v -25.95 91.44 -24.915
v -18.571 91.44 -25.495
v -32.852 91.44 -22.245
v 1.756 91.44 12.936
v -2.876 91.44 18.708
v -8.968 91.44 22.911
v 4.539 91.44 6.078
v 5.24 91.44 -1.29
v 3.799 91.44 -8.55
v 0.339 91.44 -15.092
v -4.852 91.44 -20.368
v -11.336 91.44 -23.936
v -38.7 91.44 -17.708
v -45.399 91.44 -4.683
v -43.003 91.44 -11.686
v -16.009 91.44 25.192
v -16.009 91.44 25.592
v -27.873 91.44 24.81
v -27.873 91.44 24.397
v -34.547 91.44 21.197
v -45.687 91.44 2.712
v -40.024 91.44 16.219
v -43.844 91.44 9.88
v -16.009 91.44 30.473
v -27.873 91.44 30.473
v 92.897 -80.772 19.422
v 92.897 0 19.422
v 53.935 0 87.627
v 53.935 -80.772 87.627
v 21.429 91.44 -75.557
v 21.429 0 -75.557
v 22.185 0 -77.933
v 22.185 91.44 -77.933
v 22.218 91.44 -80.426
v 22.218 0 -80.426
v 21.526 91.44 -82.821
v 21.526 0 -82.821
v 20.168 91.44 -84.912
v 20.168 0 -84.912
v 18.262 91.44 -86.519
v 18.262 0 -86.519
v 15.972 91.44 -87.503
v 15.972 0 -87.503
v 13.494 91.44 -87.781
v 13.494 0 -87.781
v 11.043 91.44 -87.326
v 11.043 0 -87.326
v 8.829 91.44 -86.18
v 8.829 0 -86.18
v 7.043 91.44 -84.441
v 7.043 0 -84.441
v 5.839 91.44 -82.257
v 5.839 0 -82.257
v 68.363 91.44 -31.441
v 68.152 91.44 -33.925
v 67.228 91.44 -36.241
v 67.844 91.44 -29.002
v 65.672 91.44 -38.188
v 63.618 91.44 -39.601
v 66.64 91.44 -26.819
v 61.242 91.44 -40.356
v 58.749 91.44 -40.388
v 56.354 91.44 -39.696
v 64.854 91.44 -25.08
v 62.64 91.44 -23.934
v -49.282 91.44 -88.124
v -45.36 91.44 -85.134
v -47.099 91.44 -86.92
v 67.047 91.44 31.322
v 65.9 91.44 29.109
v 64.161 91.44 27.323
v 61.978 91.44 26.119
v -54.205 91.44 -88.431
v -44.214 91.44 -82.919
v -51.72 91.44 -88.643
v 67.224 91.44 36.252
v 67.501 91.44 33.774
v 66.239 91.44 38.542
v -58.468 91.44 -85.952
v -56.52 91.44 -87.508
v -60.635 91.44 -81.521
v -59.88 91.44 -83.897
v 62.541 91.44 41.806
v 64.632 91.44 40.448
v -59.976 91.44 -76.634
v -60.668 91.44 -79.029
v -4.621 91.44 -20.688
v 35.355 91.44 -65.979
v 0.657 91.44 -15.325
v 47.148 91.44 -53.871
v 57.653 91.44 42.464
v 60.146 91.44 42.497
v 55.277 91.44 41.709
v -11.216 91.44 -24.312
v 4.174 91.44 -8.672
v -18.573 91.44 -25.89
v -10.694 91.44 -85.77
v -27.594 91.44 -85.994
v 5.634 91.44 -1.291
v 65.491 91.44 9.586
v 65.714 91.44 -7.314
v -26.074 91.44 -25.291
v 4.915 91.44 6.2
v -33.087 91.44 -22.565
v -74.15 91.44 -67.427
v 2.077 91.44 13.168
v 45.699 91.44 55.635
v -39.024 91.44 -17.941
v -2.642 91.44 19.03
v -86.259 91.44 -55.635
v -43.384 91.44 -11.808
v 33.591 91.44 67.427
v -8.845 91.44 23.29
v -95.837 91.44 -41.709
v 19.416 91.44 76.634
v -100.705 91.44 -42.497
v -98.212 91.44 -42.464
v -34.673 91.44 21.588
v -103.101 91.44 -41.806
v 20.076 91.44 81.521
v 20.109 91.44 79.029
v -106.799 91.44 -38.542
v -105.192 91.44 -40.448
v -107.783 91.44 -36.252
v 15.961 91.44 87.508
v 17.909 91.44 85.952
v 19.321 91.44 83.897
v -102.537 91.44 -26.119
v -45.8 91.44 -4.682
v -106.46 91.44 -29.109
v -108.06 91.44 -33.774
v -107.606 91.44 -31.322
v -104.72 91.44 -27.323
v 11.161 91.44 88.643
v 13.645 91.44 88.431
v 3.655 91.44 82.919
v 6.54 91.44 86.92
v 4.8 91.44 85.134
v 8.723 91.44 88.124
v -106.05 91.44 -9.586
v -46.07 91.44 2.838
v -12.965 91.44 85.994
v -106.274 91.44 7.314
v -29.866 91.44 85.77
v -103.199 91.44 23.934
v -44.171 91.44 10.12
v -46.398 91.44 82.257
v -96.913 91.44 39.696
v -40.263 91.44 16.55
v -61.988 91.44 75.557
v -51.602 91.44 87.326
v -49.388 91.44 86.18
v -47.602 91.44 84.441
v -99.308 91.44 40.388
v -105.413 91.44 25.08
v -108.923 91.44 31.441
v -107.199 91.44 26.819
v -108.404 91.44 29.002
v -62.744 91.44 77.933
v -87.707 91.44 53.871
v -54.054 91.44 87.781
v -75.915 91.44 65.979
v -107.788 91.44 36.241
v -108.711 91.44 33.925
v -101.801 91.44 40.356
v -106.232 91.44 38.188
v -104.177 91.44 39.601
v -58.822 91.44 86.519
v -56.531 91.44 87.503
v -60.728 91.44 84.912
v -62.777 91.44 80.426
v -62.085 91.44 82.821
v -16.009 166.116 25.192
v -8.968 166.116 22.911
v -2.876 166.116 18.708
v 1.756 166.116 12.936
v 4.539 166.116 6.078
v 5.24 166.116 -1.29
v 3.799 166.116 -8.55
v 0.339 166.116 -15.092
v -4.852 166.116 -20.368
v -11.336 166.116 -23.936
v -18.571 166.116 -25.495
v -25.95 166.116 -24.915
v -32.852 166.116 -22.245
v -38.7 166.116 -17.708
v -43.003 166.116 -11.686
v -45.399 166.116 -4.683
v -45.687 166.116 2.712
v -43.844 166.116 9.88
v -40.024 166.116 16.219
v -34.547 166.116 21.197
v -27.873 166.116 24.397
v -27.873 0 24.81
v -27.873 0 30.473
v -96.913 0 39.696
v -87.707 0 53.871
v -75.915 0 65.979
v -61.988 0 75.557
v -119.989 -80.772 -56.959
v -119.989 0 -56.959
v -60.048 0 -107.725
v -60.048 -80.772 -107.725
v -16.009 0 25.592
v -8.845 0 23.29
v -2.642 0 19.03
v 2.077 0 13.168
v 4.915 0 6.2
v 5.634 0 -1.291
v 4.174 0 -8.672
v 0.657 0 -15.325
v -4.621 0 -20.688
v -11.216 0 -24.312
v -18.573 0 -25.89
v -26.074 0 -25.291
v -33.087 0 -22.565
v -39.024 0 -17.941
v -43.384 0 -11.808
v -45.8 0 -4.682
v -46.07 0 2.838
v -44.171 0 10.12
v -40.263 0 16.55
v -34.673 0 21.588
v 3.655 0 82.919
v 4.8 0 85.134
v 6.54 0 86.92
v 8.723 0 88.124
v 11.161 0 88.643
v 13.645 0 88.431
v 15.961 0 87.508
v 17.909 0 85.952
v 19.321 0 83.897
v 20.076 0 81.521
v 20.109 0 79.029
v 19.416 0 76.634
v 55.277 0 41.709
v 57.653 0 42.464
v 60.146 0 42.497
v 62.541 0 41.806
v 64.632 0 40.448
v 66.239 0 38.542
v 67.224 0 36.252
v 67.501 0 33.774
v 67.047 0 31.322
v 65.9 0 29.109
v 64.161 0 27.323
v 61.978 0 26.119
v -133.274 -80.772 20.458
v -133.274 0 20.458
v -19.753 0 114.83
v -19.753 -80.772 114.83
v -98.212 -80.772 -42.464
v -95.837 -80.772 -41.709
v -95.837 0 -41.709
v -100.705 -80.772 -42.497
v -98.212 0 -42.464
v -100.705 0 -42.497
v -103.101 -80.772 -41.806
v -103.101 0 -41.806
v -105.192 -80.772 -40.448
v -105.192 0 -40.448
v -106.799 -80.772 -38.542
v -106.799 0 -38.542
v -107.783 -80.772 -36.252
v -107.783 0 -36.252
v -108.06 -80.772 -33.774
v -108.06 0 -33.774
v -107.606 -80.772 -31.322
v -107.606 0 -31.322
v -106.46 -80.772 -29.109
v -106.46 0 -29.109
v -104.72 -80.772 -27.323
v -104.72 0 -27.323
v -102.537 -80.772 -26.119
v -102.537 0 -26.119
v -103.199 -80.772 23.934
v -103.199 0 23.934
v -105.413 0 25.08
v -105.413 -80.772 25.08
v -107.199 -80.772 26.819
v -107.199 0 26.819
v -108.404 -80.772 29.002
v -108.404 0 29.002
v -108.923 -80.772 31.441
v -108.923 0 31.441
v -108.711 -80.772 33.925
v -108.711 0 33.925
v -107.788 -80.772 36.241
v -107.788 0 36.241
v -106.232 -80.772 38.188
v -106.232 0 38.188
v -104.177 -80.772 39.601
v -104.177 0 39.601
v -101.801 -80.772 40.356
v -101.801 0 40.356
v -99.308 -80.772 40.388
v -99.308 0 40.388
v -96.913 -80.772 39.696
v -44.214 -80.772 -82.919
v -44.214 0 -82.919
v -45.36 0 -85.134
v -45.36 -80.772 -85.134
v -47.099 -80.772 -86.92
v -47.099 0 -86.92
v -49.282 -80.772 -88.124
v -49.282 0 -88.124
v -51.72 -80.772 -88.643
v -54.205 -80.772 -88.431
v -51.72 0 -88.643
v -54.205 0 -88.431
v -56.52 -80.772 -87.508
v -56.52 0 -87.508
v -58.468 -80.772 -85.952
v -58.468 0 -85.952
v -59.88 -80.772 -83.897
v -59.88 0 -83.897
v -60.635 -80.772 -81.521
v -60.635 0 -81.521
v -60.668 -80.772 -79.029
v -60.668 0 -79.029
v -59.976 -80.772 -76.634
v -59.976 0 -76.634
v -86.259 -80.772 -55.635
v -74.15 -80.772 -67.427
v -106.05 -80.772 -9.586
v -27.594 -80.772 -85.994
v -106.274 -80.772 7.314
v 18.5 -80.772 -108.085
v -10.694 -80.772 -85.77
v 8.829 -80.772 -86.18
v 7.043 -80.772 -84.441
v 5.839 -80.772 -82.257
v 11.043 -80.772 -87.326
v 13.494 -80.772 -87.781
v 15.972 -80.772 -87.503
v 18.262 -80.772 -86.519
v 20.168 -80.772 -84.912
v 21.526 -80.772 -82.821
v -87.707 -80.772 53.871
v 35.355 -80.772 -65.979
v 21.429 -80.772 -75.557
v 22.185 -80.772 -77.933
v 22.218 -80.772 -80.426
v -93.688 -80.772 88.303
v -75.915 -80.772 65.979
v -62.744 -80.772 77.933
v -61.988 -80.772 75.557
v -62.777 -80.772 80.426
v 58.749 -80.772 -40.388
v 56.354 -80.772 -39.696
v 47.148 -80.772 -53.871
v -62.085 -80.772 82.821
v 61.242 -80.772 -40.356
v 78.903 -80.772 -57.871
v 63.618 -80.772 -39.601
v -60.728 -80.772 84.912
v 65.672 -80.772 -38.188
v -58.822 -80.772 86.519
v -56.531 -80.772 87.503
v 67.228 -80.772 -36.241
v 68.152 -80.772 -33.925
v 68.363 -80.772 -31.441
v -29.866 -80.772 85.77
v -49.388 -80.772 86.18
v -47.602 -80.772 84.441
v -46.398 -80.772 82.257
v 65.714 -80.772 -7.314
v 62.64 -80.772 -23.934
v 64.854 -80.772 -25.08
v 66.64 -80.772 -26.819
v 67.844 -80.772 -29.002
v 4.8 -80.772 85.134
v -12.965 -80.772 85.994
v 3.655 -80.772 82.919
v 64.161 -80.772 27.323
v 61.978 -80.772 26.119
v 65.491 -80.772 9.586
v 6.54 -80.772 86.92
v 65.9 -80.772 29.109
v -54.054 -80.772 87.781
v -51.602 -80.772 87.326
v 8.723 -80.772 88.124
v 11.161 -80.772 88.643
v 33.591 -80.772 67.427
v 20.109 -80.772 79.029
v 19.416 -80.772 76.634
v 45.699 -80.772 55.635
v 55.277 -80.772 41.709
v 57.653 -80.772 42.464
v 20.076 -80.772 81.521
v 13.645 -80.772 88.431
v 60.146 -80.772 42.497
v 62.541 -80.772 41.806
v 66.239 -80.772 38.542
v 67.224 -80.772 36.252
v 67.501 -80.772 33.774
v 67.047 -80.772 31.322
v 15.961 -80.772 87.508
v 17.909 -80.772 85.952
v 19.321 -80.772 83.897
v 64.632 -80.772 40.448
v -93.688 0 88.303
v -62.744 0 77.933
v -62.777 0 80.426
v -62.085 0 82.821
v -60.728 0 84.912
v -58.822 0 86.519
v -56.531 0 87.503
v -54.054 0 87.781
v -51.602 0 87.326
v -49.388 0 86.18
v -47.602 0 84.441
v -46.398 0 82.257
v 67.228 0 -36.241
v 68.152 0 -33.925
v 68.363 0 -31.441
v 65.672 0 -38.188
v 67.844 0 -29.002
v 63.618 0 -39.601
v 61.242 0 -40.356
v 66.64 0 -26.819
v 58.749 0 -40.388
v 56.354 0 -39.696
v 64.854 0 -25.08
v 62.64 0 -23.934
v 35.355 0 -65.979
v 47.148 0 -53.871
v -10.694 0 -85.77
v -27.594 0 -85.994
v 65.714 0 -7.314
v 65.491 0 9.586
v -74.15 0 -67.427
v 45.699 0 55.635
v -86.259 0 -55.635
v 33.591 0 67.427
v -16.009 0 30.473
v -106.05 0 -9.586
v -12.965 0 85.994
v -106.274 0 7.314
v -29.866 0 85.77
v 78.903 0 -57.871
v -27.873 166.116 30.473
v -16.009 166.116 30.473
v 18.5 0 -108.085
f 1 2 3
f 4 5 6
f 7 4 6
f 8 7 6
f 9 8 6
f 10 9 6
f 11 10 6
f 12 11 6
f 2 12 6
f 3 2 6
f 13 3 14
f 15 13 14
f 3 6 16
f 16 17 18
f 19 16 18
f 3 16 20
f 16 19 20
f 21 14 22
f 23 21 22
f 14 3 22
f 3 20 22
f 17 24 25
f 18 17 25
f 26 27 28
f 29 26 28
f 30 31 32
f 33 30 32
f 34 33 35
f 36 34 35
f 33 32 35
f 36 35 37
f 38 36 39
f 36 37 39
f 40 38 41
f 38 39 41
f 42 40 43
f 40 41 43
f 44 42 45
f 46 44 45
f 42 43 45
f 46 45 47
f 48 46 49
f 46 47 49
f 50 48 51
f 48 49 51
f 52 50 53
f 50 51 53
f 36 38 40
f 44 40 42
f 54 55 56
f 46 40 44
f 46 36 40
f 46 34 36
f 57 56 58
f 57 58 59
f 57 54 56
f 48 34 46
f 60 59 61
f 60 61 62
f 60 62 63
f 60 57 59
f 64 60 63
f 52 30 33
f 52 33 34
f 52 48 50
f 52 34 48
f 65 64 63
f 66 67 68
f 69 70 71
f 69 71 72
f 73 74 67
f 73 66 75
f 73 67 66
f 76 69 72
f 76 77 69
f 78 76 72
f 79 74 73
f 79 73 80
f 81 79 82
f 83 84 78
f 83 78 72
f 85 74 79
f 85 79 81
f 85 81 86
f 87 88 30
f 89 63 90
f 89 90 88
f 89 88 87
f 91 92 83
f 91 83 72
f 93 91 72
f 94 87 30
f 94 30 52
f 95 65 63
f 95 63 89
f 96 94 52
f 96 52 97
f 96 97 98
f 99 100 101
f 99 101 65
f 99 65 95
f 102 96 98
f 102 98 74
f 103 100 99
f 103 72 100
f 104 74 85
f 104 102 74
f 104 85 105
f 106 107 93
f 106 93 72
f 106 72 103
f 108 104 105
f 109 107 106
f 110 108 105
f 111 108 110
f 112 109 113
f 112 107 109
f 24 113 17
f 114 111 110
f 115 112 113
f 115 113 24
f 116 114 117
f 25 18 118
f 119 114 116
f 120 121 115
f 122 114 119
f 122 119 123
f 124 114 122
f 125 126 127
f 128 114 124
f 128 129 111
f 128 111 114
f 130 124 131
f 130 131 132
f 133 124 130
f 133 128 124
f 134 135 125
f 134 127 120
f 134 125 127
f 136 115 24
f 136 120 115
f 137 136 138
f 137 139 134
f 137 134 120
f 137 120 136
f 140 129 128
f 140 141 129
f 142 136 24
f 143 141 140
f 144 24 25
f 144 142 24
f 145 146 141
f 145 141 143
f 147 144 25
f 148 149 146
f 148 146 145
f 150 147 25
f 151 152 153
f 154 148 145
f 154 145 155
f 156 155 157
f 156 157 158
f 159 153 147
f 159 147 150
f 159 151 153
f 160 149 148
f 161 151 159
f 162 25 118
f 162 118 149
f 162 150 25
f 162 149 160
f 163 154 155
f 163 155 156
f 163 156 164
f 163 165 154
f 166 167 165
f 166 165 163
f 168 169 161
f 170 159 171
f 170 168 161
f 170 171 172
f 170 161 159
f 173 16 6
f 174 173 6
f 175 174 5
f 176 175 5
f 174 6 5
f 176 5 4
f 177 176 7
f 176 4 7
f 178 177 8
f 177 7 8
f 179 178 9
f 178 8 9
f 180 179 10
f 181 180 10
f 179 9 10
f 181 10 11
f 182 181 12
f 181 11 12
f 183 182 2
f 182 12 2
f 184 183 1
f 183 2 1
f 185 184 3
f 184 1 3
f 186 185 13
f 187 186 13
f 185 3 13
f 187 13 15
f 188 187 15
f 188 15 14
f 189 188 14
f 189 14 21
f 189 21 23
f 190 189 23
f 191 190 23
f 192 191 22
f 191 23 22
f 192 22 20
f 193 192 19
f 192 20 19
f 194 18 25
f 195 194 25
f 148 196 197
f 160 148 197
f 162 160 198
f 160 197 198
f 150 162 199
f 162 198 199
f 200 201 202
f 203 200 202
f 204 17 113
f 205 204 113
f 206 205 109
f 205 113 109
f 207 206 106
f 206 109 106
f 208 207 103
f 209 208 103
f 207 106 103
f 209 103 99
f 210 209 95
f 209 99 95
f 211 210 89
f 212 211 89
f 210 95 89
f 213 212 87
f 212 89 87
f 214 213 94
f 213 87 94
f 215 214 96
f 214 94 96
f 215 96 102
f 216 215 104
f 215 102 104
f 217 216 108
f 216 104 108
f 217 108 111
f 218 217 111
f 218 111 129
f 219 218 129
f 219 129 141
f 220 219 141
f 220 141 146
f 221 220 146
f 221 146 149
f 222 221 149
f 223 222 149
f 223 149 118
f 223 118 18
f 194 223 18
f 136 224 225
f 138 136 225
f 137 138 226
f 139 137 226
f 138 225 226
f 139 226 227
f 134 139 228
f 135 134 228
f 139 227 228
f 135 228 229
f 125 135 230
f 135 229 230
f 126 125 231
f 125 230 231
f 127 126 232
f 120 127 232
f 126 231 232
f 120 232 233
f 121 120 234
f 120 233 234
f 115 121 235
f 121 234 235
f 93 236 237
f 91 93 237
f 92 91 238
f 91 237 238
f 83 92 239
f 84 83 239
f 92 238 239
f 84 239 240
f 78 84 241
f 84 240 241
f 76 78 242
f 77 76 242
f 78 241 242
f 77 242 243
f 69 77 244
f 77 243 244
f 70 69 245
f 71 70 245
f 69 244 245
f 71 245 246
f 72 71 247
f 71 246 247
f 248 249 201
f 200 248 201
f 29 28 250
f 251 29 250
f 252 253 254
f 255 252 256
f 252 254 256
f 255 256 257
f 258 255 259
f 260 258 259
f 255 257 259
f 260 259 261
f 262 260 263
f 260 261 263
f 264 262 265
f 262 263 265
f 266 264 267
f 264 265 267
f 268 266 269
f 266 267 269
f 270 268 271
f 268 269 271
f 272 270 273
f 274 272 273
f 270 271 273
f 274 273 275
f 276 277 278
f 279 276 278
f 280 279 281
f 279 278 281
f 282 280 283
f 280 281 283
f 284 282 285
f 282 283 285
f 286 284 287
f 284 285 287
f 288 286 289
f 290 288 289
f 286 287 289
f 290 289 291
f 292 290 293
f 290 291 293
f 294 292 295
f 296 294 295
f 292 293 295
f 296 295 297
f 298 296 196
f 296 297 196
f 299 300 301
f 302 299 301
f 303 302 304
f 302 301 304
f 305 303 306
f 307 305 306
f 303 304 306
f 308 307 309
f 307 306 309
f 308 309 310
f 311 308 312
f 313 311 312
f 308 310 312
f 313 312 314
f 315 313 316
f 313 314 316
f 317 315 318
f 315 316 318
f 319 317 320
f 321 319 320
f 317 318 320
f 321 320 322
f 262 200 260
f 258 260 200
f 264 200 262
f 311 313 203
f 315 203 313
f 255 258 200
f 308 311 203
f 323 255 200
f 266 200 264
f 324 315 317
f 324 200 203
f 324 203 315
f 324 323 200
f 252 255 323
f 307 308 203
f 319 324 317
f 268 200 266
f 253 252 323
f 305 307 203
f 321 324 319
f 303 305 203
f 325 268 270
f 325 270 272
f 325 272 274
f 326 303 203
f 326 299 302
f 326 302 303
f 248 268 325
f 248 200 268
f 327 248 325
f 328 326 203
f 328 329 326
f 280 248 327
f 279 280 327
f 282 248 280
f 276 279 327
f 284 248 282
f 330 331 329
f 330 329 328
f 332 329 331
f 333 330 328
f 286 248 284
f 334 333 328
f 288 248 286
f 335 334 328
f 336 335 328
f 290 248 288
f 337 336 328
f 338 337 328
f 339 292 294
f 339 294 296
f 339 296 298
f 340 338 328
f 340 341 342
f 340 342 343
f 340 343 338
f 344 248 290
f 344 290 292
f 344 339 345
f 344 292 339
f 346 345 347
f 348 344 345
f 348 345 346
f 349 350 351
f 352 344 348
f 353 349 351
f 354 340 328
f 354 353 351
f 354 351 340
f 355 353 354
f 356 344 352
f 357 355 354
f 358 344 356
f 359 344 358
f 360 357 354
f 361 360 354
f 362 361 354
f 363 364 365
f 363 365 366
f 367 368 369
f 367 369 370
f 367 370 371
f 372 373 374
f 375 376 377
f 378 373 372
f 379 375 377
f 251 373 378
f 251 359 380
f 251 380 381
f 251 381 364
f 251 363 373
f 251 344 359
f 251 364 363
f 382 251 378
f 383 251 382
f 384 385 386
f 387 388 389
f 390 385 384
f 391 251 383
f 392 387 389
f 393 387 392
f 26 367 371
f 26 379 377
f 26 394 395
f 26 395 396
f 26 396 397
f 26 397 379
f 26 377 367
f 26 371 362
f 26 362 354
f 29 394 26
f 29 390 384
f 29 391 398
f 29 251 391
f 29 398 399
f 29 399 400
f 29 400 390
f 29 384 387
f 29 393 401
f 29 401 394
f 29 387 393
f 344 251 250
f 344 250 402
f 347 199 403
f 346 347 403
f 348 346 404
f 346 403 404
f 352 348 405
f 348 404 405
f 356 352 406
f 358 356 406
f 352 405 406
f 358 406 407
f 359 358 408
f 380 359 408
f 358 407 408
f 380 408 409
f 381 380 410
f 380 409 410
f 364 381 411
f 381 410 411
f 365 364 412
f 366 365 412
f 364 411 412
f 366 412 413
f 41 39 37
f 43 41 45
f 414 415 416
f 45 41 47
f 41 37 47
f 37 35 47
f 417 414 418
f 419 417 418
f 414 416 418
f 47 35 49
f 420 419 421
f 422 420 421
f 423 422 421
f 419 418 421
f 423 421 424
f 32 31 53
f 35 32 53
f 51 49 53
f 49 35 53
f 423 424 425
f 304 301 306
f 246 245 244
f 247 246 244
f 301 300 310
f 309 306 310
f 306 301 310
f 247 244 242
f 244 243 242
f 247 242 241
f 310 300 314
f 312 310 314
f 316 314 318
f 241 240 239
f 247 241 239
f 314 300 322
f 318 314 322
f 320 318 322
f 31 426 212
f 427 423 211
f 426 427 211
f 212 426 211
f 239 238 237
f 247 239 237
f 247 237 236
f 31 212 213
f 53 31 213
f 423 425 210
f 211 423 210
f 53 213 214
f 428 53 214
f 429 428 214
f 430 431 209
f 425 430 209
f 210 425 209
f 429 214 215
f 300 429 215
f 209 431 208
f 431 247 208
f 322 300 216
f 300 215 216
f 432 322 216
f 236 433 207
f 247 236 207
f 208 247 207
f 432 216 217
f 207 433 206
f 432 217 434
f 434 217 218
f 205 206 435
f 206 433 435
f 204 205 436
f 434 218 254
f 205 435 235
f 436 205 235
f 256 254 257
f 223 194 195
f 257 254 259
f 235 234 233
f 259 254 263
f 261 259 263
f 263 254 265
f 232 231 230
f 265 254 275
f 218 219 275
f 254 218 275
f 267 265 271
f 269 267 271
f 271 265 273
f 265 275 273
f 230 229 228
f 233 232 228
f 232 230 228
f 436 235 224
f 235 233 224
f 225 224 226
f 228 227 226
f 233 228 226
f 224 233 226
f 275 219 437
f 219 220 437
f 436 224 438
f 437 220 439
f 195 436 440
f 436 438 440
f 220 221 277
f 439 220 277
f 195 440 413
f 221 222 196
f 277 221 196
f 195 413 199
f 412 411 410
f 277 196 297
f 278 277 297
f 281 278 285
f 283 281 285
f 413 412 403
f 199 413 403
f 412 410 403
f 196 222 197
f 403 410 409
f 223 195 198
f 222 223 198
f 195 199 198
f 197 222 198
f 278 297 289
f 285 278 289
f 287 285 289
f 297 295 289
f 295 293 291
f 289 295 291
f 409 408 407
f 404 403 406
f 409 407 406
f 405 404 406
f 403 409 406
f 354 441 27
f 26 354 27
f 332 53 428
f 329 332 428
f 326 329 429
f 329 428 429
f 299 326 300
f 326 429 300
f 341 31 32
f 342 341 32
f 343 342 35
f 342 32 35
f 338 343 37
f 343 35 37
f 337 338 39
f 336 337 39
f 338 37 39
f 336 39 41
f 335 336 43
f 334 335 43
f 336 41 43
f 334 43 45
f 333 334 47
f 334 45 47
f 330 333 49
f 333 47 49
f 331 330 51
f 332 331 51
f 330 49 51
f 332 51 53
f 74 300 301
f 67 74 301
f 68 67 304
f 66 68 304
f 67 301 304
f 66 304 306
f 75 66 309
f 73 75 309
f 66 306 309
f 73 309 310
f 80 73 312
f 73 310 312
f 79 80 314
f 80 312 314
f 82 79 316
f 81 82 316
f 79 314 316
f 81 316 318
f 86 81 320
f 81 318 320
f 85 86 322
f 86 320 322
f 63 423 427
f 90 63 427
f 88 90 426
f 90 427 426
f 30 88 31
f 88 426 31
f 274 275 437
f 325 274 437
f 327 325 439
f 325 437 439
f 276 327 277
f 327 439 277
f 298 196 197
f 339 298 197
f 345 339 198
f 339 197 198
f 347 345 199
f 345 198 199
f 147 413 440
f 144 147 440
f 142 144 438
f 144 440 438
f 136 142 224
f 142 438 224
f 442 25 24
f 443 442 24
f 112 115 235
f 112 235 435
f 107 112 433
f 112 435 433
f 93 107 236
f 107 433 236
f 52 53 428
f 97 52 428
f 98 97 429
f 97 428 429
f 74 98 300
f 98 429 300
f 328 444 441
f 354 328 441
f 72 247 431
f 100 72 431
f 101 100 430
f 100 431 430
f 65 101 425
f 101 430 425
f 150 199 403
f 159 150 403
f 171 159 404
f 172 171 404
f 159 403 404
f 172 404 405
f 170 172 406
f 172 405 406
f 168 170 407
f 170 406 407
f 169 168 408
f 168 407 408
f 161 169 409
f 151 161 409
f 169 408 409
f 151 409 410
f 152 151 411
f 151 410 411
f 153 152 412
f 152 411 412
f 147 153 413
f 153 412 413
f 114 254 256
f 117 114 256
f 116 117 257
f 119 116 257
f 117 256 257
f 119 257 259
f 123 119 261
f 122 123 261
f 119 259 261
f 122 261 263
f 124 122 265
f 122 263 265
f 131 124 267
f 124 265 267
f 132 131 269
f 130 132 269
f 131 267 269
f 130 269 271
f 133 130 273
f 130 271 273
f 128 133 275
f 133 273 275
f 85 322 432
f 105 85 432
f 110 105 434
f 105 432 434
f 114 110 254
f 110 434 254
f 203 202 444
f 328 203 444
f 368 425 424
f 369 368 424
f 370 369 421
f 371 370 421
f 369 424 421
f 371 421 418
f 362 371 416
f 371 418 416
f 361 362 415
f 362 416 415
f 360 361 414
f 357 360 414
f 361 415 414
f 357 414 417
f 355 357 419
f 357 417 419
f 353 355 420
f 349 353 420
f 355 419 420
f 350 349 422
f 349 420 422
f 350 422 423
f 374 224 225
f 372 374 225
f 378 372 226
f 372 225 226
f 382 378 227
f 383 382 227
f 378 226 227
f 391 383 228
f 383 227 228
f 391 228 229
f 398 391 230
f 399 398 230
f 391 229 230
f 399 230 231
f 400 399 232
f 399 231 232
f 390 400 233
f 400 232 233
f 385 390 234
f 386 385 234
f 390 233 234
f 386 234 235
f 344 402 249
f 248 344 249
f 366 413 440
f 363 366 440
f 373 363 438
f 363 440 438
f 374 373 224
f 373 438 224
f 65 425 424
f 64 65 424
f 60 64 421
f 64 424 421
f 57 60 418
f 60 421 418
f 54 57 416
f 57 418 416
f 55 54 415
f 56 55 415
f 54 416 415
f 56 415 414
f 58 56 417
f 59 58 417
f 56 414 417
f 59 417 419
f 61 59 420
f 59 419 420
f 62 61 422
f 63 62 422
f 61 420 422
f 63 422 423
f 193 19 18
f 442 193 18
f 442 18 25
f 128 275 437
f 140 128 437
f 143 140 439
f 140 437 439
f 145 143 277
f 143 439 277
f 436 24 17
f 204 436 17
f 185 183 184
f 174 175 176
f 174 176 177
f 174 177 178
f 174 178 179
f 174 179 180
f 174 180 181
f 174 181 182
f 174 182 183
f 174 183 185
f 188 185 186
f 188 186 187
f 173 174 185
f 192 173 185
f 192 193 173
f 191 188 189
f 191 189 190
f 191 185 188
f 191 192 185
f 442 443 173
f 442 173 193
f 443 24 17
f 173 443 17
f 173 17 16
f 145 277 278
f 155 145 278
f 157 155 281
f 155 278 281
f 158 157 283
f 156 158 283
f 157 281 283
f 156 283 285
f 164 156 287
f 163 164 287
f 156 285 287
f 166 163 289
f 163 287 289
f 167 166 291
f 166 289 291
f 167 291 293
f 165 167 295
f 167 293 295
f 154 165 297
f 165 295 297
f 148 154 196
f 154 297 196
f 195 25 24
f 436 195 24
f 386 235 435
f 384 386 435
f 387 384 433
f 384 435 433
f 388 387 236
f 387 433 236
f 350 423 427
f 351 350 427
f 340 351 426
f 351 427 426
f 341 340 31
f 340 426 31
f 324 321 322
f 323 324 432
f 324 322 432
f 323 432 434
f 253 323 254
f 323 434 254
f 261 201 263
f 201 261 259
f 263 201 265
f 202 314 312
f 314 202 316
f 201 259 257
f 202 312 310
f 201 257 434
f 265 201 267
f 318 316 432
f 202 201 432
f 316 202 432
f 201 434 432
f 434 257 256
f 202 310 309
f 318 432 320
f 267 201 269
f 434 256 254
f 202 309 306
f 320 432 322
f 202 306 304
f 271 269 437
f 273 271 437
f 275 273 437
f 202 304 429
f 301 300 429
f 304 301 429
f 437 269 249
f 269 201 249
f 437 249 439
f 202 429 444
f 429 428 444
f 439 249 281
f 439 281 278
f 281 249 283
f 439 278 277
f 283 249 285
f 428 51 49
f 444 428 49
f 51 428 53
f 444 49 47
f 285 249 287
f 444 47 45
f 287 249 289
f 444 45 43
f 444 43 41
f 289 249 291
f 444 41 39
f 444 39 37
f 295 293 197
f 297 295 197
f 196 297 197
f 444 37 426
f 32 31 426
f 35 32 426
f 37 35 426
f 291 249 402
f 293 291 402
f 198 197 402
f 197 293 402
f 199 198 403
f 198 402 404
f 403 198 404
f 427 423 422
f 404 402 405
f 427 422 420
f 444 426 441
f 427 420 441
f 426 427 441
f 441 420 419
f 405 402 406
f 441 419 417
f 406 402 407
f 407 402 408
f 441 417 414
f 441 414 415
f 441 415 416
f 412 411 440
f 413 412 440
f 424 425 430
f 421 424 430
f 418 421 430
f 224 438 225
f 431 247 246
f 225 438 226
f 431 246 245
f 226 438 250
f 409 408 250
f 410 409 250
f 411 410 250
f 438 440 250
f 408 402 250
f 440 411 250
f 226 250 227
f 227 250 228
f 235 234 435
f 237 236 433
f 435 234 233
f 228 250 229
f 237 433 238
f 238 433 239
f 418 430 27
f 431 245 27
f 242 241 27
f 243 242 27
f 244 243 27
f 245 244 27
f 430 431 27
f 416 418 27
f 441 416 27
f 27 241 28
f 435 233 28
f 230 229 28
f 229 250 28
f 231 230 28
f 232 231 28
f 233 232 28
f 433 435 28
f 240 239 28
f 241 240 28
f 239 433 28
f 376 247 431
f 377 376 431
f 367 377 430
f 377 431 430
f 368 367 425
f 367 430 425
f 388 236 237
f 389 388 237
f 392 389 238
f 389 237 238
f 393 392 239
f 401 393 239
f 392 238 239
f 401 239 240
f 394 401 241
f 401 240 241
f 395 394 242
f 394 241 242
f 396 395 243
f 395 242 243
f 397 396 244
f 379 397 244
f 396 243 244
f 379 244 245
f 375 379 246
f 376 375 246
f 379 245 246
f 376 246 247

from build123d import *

# Parameters (mm, degrees)
F1_DEPTH = 80.772
F2_R     = 48.2897406473
F3_DEPTH = 91.44
F5_DEPTH = 218.694
F7_DEPTH = 74.676
F8_DEPTH = 15.494


with BuildPart() as f1:
    # F0 (on Front) → F1 (new body)
    with BuildSketch(Plane.XZ):
        Polygon((78.9029603352, -57.8708041925), (92.8972656379, 19.4217663724), (53.9348187704, 87.6266766027), (-19.7534183585, 114.8300909886), (-93.6879006429, 88.3032296066), (-133.2738621314, 20.4583057106), (-119.9885914948, -56.9592867961), (-60.0484145132, -107.724995979), (18.4999938429, -108.0849823133), align=None)
        with BuildLine():
            ThreePointArc((-96.9131855193, 39.6960148153), (-82.1078442057, 60.2141659197), (-61.988398234, 75.5569345729))
            ThreePointArc((-61.988398234, 75.5569345729), (-57.7127844254, 87.0956887984), (-46.398431086, 82.2573904373))
            ThreePointArc((-46.398431086, 82.2573904373), (-21.4209500621, 86.29695698), (3.654622375, 82.9193360566))
            ThreePointArc((3.654622375, 82.9193360566), (14.8370692522, 88.0551518981), (19.4163316426, 76.6335023466))
            ThreePointArc((19.4163316426, 76.6335023466), (39.9344827469, 61.828161033), (55.2772514002, 41.7087150613))
            ThreePointArc((55.2772514002, 41.7087150613), (66.8160056257, 37.4331012527), (61.9777072646, 26.1187479133))
            ThreePointArc((61.9777072646, 26.1187479133), (66.0172738073, 1.1412668894), (62.6396528839, -23.9343055477))
            ThreePointArc((62.6396528839, -23.9343055477), (67.7754687254, -35.1167524249), (56.3538191739, -39.6960148153))
            ThreePointArc((56.3538191739, -39.6960148153), (41.5484778603, -60.2141659197), (21.4290318886, -75.5569345729))
            ThreePointArc((21.4290318886, -75.5569345729), (17.15341808, -87.0956887984), (5.8390647406, -82.2573904373))
            ThreePointArc((5.8390647406, -82.2573904373), (-19.1384162833, -86.29695698), (-44.2139887204, -82.9193360566))
            ThreePointArc((-44.2139887204, -82.9193360566), (-55.3964355976, -88.0551518981), (-59.975697988, -76.6335023466))
            ThreePointArc((-59.975697988, -76.6335023466), (-80.4938490924, -61.828161033), (-95.8366177456, -41.7087150613))
            ThreePointArc((-95.8366177456, -41.7087150613), (-107.3753719711, -37.4331012527), (-102.53707361, -26.1187479133))
            ThreePointArc((-102.53707361, -26.1187479133), (-106.5766401527, -1.1412668894), (-103.1990192293, 23.9343055477))
            ThreePointArc((-103.1990192293, 23.9343055477), (-108.3348350708, 35.1167524249), (-96.9131855193, 39.6960148153))
        make_face(mode=Mode.SUBTRACT)
    extrude(amount=F1_DEPTH)


with BuildPart() as f3:
    # F2 (on face) → F3 (new body)
    with BuildSketch(Plane(origin=(0, 0, 0), x_dir=(-1, 0, 0), z_dir=(0, 1, 0))):
        with BuildLine():
            ThreePointArc((46.398431086, 82.2573904373), (21.4209500621, 86.29695698), (-3.654622375, 82.9193360566))
            ThreePointArc((-3.654622375, 82.9193360566), (-14.8370692522, 88.0551518981), (-19.4163316426, 76.6335023466))
            ThreePointArc((-19.4163316426, 76.6335023466), (-39.9344827469, 61.828161033), (-55.2772514002, 41.7087150613))
            ThreePointArc((-55.2772514002, 41.7087150613), (-66.8160056257, 37.4331012527), (-61.9777072646, 26.1187479133))
            ThreePointArc((-61.9777072646, 26.1187479133), (-66.0172738073, 1.1412668894), (-62.6396528839, -23.9343055477))
            ThreePointArc((-62.6396528839, -23.9343055477), (-67.7754687254, -35.1167524249), (-56.3538191739, -39.6960148153))
            ThreePointArc((-56.3538191739, -39.6960148153), (-41.5484778603, -60.2141659197), (-21.4290318886, -75.5569345729))
            ThreePointArc((-21.4290318886, -75.5569345729), (-17.15341808, -87.0956887984), (-5.8390647406, -82.2573904373))
            ThreePointArc((-5.8390647406, -82.2573904373), (19.1384162833, -86.29695698), (44.2139887204, -82.9193360566))
            ThreePointArc((44.2139887204, -82.9193360566), (55.3964355976, -88.0551518981), (59.975697988, -76.6335023466))
            ThreePointArc((59.975697988, -76.6335023466), (80.4938490924, -61.828161033), (95.8366177456, -41.7087150613))
            ThreePointArc((95.8366177456, -41.7087150613), (107.3753719711, -37.4331012527), (102.53707361, -26.1187479133))
            ThreePointArc((102.53707361, -26.1187479133), (106.5766401527, -1.1412668894), (103.1990192293, 23.9343055477))
            ThreePointArc((103.1990192293, 23.9343055477), (108.3348350708, 35.1167524249), (96.9131855193, 39.6960148153))
            ThreePointArc((96.9131855193, 39.6960148153), (82.1078442057, 60.2141659197), (61.988398234, 75.5569345729))
            ThreePointArc((61.988398234, 75.5569345729), (57.7127844254, 87.0956887984), (46.398431086, 82.2573904373))
        make_face()
        with Locations((20.2796831727, 0)):
            Circle(F2_R, mode=Mode.SUBTRACT)
        with Locations((20.2796831727, 0)):
            Circle(F2_R)
    extrude(amount=F3_DEPTH)

    # F4 (on face) → F5 (cut)
    with BuildSketch(Plane(origin=(0, 91.44, 0), x_dir=(-1, 0, 0), z_dir=(0, 1, 0))):
        with BuildLine():
            Line((16.0086341202, 30.472913757), (16.0086341202, 25.5923304851))
            ThreePointArc((16.0086341202, 25.5923304851), (18.5729035963, -25.890078083), (27.8734695166, 24.8101521283))
            Line((27.8734695166, 24.8101521283), (27.8734695166, 30.472913757))
            Line((27.8734695166, 30.472913757), (16.0086341202, 30.472913757))
        make_face()
    extrude(amount=-F5_DEPTH, mode=Mode.SUBTRACT)

    # F8 (add): a face of the model
    f8_faces = [f3.faces().sort_by_distance(p)[0] for p in [
        (-80.311361603, 91.44, 58.4645796519),
    ]]


with BuildPart() as f7:
    # F6 (on face) → F7 (new body)
    with BuildSketch(Plane(origin=(0, 91.44, 0), x_dir=(-1, 0, 0), z_dir=(0, 1, 0))):
        with BuildLine():
            Line((16.0086341202, 30.472913757), (16.0086341202, 25.1923010677))
            ThreePointArc((16.0086341202, 25.1923010677), (18.5714232378, -25.4946218071), (27.8734695166, 24.3973011224))
            Line((27.8734695166, 24.3973011224), (27.8734695166, 30.472913757))
            Line((27.8734695166, 30.472913757), (16.0086341202, 30.472913757))
        make_face()
    extrude(amount=F7_DEPTH)


with BuildPart() as f3_1:
    add(f3.part)

    add(f7.part)  # F8 merges F7
    extrude(f8_faces, amount=-F8_DEPTH)


solid = Compound([f1.part, f3_1.part])
